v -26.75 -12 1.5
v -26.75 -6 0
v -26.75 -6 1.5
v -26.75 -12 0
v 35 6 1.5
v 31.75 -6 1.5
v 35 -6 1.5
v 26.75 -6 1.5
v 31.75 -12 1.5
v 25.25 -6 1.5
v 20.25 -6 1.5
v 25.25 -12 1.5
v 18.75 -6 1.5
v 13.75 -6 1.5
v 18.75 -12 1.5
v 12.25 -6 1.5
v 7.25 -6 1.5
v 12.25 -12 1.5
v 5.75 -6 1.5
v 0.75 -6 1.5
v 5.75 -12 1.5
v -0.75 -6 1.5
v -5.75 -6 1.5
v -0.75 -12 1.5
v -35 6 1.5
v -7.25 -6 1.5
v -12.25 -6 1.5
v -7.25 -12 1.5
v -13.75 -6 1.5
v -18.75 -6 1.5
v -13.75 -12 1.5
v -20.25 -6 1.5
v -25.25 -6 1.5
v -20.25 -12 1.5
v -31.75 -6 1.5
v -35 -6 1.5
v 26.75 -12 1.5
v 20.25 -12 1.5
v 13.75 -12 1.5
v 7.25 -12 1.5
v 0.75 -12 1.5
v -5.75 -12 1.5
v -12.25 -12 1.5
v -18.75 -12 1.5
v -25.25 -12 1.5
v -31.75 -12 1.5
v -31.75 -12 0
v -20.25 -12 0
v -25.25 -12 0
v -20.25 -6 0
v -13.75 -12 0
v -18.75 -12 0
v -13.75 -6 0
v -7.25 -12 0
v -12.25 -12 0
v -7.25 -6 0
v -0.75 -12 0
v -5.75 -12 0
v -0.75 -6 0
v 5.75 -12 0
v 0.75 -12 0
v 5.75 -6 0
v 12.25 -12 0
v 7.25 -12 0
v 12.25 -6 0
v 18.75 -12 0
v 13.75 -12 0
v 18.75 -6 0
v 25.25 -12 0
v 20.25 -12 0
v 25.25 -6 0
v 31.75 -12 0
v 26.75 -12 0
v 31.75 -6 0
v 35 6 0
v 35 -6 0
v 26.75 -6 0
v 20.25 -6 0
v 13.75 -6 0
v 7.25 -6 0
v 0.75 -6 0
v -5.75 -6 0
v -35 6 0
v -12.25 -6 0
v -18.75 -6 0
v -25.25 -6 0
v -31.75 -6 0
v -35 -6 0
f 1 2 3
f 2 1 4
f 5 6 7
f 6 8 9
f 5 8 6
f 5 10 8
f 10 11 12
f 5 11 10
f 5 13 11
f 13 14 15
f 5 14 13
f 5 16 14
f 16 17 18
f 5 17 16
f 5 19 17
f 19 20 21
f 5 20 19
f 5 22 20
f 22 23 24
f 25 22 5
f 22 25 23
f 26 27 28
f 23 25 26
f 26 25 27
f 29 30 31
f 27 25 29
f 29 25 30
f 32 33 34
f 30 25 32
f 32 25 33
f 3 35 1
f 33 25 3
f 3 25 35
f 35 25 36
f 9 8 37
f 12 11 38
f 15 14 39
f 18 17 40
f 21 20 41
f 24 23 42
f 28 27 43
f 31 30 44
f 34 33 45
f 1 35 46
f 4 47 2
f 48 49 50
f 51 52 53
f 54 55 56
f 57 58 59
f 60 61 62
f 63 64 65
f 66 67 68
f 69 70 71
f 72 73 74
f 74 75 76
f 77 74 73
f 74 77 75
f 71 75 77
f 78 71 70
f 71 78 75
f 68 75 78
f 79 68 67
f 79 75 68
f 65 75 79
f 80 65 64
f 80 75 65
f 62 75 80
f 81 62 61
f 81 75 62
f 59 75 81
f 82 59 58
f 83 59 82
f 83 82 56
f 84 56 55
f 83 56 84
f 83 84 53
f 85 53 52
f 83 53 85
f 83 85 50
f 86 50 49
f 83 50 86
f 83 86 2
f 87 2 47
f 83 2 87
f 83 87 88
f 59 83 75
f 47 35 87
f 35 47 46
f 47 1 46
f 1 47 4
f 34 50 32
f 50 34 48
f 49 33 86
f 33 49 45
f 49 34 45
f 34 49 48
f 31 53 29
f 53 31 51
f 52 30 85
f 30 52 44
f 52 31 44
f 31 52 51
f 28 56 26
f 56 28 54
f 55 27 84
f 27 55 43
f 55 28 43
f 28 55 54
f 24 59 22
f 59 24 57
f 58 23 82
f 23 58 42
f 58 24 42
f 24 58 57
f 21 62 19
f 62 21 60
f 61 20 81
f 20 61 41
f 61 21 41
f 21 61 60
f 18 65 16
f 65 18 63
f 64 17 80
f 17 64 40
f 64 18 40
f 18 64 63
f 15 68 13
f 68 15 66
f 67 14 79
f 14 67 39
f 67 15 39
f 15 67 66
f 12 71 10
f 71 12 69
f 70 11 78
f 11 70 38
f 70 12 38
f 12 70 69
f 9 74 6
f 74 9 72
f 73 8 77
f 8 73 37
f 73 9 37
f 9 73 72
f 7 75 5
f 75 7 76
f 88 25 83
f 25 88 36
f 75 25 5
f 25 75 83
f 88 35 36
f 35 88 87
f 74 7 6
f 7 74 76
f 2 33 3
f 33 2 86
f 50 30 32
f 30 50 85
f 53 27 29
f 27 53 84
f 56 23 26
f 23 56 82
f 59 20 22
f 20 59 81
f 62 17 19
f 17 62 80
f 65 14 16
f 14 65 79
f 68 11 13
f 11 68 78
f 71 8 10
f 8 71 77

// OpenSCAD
// 10-well agarose gel comb, printed flat on the bed (Z = thickness)

// --- Dimensions (mm) ---
plate_thick   = 1.5;   // Z thickness of the whole comb
spine_len     = 70.0;  // X length of the back bar
spine_width   = 12.0;  // Y width of the back bar
tooth_w       = 5.0;   // X width of each tooth
tooth_len     = 12.0;  // Y length of each tooth (hangs in -Y from spine)
gap           = 1.5;   // X gap between neighbouring teeth
n_tooth       = 10;    // number of teeth

// --- Derived layout ---
row_width     = n_tooth * tooth_w + (n_tooth - 1) * gap;  // total X span of the tooth row
row_x0        = -row_width / 2.0;                          // left edge of the tooth row (centred on X)
tooth_x0      = row_x0;                                    // X of the left edge of tooth 0
tooth_y0      = -tooth_len;                                // Y of the tip (bottom) of each tooth

$fn = 64;

// --- Model (rests on z = 0, centred on origin in X and Y) ---
union() {
    // Back bar (spine): centred on origin in X and Y
    translate([-spine_len/2, -spine_width/2, 0])
        cube([spine_len, spine_width, plate_thick]);

    // Teeth: hang from the -Y edge of the spine
    for (i = [0 : n_tooth - 1]) {
        tx = tooth_x0 + i * (tooth_w + gap);   // X of left edge of tooth i
        translate([tx, tooth_y0, 0])
            cube([tooth_w, tooth_len, plate_thick]);
    }
}
